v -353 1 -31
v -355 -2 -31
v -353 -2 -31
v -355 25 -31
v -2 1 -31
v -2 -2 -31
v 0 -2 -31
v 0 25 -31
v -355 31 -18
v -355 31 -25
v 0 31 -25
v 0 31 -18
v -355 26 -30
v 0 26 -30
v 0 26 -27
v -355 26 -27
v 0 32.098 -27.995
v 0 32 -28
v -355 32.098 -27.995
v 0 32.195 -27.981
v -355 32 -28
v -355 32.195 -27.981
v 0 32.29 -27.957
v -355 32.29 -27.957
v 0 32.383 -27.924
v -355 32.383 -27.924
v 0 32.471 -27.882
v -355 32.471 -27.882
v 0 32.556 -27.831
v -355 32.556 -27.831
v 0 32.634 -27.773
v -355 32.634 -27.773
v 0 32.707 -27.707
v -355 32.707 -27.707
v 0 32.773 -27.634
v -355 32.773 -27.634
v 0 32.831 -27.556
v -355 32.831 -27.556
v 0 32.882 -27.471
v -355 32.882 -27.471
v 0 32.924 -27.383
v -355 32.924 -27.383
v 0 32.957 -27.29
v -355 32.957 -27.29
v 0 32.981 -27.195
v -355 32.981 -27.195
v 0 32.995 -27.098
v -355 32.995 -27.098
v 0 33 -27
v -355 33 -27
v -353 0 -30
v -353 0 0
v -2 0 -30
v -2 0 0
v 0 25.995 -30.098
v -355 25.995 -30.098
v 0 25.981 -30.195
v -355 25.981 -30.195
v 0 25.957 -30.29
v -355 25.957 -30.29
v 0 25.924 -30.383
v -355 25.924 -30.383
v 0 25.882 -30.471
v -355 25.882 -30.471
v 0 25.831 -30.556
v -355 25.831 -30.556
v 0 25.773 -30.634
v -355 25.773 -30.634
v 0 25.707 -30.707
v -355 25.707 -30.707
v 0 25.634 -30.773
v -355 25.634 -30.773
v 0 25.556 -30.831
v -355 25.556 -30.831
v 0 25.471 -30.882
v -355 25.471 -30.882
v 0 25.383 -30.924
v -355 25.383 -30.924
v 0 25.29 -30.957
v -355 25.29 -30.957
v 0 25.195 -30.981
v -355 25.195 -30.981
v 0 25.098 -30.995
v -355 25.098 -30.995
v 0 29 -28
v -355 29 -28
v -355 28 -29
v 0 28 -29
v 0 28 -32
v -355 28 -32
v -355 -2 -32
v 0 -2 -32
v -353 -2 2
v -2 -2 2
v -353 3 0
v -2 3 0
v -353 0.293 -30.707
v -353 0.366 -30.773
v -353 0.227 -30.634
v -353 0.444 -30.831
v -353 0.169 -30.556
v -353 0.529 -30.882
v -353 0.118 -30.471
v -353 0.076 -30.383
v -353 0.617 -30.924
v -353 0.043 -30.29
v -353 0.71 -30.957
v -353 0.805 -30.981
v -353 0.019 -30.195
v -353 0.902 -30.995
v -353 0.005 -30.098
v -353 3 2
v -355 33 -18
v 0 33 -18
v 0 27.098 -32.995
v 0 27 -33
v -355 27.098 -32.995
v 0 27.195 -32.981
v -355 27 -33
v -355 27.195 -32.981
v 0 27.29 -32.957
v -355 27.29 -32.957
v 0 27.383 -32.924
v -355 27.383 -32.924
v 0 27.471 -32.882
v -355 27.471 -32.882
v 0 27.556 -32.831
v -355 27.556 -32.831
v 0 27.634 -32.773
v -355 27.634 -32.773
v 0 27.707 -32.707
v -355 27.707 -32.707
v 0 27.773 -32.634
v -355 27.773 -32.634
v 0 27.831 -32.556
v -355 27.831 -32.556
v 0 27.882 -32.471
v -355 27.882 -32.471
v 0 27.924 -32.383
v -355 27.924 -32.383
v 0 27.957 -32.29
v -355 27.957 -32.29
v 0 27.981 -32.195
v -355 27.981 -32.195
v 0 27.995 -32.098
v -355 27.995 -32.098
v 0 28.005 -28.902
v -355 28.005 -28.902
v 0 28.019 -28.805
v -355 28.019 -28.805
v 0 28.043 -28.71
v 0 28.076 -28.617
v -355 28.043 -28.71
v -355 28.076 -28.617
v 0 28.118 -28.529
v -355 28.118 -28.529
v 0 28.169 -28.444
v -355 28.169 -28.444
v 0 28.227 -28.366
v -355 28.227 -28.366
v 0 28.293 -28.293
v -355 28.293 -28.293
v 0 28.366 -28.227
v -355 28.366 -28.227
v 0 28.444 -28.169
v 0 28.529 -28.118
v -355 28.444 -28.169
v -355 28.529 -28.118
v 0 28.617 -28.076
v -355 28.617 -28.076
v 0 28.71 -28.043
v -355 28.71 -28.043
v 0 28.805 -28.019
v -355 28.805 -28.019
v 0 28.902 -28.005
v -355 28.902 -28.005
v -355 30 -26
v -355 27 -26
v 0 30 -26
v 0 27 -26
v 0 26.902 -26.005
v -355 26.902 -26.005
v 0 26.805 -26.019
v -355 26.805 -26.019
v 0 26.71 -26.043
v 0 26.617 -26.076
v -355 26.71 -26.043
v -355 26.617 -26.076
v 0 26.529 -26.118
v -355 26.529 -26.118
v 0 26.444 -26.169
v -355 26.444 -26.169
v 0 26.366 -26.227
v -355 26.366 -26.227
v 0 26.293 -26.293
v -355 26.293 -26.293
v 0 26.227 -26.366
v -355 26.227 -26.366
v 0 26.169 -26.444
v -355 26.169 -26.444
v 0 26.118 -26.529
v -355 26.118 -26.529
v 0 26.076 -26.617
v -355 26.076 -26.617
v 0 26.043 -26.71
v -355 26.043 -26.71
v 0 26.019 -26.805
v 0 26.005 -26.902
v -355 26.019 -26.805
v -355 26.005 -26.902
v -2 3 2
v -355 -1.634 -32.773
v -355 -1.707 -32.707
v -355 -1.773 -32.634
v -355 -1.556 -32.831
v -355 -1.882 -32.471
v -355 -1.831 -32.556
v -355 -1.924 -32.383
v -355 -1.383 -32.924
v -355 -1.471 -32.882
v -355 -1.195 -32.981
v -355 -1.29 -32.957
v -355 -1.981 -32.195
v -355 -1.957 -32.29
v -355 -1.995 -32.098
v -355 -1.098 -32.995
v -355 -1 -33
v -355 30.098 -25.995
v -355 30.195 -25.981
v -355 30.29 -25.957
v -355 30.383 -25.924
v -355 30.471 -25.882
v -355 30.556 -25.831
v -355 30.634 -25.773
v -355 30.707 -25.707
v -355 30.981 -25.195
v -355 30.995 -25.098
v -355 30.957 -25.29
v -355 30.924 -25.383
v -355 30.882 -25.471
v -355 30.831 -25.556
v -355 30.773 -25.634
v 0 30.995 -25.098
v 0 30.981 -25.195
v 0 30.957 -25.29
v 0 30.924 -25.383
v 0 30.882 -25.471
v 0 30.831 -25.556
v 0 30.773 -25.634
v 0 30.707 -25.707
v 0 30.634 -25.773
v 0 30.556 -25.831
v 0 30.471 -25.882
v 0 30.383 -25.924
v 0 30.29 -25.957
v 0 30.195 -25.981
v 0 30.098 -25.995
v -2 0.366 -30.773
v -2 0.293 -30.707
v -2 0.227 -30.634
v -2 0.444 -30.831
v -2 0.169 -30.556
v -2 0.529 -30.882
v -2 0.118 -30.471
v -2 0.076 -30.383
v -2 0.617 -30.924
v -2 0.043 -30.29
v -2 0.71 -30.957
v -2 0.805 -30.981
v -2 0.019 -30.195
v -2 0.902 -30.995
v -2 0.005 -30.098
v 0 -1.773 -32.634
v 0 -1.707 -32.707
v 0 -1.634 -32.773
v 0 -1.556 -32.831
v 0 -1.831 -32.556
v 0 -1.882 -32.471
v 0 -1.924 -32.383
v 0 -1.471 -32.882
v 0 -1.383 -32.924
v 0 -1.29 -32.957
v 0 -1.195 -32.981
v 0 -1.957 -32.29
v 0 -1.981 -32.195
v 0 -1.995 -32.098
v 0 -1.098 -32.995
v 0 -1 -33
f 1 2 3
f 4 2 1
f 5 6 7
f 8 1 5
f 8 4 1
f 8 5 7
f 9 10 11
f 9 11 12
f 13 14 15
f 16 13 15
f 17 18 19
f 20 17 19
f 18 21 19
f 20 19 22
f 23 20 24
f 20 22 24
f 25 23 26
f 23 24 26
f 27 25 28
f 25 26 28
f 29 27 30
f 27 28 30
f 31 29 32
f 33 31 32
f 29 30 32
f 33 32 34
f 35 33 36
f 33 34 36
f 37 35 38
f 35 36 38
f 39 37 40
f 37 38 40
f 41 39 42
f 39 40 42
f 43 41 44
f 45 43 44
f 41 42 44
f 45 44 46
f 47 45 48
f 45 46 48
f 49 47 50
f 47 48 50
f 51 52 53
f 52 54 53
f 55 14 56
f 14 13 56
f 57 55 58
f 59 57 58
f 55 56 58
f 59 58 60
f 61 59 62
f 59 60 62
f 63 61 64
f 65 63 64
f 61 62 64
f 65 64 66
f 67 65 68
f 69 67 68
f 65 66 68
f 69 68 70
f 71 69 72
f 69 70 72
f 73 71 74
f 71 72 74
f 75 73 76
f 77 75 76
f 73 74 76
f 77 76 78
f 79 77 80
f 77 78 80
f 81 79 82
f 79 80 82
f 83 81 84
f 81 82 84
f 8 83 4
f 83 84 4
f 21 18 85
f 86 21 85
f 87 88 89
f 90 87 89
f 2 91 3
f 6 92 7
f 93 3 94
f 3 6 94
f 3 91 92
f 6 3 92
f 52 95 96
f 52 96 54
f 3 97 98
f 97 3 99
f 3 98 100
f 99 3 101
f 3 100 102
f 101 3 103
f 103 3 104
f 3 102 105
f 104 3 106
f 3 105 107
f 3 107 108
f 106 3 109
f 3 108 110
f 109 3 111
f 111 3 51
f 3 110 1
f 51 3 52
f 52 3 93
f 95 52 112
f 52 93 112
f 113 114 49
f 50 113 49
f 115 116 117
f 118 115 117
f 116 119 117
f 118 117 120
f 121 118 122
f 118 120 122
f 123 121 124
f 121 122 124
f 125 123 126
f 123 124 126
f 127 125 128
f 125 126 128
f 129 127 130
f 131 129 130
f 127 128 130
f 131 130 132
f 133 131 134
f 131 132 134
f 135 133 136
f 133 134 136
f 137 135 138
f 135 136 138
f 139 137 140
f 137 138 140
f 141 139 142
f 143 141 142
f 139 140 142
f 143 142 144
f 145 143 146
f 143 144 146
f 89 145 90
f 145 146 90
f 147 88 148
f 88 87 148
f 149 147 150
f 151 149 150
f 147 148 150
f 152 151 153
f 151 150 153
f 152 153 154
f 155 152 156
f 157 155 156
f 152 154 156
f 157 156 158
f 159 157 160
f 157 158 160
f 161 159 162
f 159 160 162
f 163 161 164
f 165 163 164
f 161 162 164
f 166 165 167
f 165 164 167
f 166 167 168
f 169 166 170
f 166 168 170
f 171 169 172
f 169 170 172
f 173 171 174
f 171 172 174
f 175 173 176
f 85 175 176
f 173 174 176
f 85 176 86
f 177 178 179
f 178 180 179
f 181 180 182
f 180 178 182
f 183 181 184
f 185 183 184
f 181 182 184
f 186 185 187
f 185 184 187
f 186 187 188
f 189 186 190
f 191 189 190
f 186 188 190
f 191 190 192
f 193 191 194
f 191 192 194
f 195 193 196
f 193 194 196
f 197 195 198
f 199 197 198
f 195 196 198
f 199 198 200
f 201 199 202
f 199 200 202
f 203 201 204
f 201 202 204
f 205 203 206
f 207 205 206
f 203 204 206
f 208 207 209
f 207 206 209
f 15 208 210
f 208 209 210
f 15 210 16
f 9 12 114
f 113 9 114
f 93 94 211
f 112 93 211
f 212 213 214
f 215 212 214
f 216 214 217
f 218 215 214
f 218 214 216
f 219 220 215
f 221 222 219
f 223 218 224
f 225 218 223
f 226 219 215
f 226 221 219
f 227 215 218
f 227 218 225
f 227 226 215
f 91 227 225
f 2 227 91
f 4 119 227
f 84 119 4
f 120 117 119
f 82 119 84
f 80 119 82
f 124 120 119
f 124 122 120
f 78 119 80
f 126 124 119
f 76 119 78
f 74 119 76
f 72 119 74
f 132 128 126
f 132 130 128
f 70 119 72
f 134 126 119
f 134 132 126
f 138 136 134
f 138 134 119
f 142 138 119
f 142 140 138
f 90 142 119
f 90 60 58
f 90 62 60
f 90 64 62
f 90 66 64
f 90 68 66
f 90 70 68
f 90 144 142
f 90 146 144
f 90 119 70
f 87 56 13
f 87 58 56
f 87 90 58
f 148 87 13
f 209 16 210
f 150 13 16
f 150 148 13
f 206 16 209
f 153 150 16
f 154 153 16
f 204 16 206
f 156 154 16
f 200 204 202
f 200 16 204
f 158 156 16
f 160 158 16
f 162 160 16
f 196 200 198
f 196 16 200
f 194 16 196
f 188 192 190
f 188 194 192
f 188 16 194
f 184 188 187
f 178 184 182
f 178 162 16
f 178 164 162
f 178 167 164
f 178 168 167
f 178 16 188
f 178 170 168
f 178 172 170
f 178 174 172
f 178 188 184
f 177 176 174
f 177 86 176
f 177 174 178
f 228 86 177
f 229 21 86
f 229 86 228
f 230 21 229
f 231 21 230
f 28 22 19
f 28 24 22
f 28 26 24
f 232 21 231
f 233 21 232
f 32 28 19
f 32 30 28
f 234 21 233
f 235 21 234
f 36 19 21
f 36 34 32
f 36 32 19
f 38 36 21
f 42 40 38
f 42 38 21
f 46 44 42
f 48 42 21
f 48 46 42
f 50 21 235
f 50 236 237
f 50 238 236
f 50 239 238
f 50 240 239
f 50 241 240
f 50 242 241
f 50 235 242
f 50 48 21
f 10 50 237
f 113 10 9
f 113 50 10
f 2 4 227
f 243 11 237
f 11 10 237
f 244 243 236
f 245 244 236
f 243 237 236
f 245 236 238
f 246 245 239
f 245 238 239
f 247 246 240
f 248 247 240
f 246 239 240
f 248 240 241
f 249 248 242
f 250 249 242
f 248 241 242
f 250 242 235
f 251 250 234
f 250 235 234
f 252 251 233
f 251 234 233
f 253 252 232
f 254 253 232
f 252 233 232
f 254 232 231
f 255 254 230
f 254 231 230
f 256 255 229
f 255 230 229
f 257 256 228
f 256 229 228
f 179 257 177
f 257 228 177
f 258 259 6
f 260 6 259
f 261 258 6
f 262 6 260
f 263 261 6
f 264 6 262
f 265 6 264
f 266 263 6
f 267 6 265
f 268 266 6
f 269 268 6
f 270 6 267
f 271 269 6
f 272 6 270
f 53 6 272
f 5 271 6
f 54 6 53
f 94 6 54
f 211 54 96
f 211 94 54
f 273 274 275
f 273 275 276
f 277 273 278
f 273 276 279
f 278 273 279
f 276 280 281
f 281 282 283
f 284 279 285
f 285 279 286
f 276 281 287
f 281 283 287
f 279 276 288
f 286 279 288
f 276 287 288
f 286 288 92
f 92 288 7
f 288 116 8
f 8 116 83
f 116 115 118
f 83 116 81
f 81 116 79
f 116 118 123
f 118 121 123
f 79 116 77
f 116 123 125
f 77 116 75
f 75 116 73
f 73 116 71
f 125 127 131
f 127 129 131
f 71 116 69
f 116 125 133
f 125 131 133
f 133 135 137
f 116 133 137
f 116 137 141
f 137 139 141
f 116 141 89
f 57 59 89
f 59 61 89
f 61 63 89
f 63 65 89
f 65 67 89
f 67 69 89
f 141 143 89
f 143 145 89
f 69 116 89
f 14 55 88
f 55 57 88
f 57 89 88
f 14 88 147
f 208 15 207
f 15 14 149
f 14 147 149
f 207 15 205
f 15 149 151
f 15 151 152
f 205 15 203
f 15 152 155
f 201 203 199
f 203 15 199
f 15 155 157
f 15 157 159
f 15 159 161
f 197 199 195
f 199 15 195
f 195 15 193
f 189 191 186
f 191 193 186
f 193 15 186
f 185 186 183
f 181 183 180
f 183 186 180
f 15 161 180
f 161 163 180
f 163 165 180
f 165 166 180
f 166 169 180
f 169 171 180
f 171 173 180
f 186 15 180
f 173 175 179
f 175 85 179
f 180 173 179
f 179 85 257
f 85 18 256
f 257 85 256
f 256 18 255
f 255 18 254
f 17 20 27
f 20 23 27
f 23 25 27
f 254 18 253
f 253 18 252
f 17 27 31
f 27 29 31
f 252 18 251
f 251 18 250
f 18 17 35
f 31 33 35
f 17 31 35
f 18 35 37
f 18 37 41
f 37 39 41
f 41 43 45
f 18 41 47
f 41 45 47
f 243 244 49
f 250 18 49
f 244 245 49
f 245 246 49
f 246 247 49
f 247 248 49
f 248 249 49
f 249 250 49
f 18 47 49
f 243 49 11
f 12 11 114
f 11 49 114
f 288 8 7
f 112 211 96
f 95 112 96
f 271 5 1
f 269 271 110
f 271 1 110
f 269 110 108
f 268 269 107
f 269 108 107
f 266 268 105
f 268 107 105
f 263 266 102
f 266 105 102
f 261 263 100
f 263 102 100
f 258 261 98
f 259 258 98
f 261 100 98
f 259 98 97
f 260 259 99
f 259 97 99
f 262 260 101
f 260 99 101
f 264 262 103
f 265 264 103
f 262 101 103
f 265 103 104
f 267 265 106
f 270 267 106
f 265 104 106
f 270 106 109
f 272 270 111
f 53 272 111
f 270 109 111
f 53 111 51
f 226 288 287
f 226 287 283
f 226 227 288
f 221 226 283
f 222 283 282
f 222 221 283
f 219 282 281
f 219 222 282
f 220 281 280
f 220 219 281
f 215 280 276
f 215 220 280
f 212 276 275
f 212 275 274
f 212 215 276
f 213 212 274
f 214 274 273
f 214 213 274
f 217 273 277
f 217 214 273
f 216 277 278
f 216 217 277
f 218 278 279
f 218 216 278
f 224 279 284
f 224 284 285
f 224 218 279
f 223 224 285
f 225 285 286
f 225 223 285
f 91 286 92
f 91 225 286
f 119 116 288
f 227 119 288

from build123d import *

# Parameters (mm, degrees)
BOSS_EXTRUDE5_DEPTH = 355
SKETCH7_W           = 2
SKETCH7_H           = 27.946586717
CUT_EXTRUDE1_DEPTH  = 33
SKETCH9_W           = 2
SKETCH9_H           = 28
CUT_EXTRUDE2_DEPTH  = 33
FILLET4_R           = 1
FILLET5_R           = 1
FILLET6_R           = 1
FILLET7_R           = 1


with BuildPart() as part:
    # Sketch6 → Boss-Extrude5 (new body)
    with BuildSketch(Plane(origin=(0, 0, 0), x_dir=(0, 0, -1), z_dir=(1, 0, 0))):
        Polygon((0, 3), (0, 0), (31, 0), (31, 26), (26, 26), (26, 31), (18, 31), (18, 33), (28, 33), (28, 28), (33, 28), (33, -2), (-2, -2), (-2, 3), align=None)
    extrude(amount=-BOSS_EXTRUDE5_DEPTH)

    # Sketch7 → Cut-Extrude1 (cut)
    with BuildSketch(Plane.XY.offset(2)):
        with Locations((-1, 11.973293359)):
            Rectangle(SKETCH7_W, SKETCH7_H)
    extrude(amount=-CUT_EXTRUDE1_DEPTH, mode=Mode.SUBTRACT)

    # Sketch9 → Cut-Extrude2 (cut)
    with BuildSketch(Plane.XY.offset(2)):
        with Locations((-354, 12)):
            Rectangle(SKETCH9_W, SKETCH9_H)
    extrude(amount=-CUT_EXTRUDE2_DEPTH, mode=Mode.SUBTRACT)

    # Fillet4
    fillet4_edges = [part.edges().sort_by_distance(p)[0] for p in [
        (-177.5, 26, -31),
        (-177.5, 31, -26),
        (-177.5, 33, -28),
        (-177.5, 28, -28),
        (-177.5, 28, -33),
    ]]
    fillet(fillet4_edges, radius=FILLET4_R)

    # Fillet5
    fillet5_edges = [part.edges().sort_by_distance(p)[0] for p in [
        (-177.5, -2, -33),
    ]]
    fillet(fillet5_edges, radius=FILLET5_R)

    # Fillet6
    fillet6_edges = [part.edges().sort_by_distance(p)[0] for p in [
        (-177.5, 0, -31),
    ]]
    fillet(fillet6_edges, radius=FILLET6_R)

    # Fillet7
    fillet7_edges = [part.edges().sort_by_distance(p)[0] for p in [
        (-177.5, 26, -26),
    ]]
    fillet(fillet7_edges, radius=FILLET7_R)


solid = part.part
